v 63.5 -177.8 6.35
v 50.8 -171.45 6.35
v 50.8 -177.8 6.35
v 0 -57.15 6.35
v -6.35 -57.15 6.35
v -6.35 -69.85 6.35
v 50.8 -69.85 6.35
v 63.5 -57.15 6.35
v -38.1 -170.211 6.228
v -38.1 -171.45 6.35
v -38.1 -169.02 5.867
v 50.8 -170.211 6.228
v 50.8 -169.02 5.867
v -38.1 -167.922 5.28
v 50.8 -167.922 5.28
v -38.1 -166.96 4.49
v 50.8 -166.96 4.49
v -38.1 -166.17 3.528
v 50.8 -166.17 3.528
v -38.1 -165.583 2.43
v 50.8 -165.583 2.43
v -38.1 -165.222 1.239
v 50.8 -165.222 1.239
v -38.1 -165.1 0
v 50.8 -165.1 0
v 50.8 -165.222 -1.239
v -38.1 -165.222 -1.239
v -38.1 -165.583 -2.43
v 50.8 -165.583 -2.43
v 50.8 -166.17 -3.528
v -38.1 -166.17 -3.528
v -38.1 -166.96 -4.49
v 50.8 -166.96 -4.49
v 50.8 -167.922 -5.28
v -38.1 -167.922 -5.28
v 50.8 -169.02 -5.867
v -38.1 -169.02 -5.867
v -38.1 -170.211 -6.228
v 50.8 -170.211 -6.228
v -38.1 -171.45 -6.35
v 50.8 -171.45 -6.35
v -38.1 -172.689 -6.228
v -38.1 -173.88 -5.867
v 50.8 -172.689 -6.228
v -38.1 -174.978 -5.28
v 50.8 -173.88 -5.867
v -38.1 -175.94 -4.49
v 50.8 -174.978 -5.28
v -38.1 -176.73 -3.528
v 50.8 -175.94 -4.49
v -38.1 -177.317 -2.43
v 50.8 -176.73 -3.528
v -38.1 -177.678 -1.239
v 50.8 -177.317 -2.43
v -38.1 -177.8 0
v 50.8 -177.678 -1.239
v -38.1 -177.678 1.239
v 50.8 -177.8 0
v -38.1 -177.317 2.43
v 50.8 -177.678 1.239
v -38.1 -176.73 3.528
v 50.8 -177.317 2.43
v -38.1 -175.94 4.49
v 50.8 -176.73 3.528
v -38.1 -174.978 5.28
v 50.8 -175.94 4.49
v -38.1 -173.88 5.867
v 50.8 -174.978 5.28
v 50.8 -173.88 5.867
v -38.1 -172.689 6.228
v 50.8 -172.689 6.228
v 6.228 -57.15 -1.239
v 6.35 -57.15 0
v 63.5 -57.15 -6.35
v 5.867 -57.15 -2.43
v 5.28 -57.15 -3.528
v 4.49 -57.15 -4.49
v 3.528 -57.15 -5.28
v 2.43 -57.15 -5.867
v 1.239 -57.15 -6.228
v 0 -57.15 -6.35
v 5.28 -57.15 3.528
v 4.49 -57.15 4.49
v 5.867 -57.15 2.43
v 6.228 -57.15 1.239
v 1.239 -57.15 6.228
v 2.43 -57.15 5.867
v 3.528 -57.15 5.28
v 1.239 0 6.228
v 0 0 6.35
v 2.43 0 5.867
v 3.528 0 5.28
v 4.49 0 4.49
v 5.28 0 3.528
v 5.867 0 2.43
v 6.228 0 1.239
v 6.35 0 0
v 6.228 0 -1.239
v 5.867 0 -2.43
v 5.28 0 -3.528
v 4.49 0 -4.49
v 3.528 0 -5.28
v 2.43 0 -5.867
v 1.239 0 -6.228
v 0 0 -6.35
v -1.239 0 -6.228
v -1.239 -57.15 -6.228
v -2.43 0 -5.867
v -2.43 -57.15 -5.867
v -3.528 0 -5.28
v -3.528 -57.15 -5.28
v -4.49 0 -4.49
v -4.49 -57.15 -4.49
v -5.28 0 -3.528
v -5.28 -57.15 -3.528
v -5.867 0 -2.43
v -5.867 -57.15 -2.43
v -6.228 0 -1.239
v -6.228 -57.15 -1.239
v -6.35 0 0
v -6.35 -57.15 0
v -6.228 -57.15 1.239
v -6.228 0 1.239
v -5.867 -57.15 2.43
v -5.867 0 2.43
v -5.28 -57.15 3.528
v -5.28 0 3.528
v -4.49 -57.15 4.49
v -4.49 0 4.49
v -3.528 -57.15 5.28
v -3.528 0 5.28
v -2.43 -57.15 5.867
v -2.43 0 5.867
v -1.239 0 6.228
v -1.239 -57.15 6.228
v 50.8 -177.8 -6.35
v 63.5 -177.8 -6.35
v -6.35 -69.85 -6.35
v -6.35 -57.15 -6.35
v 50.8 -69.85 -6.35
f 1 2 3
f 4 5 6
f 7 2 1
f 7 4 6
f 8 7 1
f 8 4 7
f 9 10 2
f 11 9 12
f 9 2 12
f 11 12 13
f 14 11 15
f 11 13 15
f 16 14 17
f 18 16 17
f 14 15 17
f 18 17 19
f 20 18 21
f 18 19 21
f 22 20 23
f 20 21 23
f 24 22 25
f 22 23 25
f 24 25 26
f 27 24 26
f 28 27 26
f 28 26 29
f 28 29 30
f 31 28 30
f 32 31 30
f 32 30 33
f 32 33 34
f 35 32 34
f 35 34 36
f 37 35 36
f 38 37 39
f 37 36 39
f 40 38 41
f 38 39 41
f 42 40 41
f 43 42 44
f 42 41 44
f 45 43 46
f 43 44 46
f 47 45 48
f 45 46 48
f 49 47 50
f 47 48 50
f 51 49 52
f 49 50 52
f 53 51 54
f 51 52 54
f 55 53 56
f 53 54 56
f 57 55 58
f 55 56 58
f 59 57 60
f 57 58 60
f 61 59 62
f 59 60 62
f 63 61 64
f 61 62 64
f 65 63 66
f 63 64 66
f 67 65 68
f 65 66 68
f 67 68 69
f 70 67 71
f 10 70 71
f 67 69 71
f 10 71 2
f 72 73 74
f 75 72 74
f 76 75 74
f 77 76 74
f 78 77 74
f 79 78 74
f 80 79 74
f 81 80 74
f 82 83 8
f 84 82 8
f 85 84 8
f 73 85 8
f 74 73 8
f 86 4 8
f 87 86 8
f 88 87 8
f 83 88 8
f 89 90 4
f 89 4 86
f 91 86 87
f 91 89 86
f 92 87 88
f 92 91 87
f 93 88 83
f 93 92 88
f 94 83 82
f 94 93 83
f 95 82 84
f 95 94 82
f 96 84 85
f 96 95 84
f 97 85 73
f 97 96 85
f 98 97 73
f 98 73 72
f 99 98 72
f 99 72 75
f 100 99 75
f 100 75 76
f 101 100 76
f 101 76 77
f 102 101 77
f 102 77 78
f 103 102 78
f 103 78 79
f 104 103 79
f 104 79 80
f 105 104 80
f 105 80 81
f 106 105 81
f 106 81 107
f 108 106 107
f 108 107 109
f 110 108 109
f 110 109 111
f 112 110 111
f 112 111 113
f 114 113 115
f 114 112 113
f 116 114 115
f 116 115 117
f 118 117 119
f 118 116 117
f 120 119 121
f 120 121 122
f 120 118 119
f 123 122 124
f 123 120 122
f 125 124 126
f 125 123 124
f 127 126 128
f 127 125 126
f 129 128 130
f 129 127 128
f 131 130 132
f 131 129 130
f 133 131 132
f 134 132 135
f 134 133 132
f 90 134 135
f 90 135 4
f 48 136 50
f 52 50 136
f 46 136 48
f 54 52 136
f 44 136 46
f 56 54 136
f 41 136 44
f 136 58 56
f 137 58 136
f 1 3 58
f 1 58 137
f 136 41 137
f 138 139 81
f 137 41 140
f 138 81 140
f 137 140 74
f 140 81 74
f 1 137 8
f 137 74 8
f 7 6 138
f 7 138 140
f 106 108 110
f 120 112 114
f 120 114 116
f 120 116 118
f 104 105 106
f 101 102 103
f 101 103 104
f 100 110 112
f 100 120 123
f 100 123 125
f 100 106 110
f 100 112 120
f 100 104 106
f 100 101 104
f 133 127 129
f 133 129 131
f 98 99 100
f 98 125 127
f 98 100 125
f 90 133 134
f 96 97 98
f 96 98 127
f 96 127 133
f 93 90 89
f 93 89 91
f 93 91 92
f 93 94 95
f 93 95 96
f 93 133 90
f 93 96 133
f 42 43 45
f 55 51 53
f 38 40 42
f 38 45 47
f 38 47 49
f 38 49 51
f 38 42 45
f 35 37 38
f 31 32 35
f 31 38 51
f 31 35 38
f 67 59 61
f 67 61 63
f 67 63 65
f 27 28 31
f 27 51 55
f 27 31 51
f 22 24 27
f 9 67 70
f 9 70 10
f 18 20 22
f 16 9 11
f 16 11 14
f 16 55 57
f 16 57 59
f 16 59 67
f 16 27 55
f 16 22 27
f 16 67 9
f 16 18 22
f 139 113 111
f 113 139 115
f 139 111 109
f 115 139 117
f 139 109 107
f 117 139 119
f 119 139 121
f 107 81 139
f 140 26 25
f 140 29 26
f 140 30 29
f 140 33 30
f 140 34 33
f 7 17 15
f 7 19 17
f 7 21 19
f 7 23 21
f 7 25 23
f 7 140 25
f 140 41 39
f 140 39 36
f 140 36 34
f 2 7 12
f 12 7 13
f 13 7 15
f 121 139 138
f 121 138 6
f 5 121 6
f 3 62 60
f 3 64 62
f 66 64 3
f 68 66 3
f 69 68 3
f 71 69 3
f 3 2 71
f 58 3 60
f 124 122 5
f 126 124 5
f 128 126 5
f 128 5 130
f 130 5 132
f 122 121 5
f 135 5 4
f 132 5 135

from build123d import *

# Parameters (mm, degrees)
SKETCH2_R           = 6.35
BOSS_EXTRUDE1_DEPTH = 57.15
SKETCH4_W           = 69.85
SKETCH4_H           = 12.7
BOSS_EXTRUDE6_DEPTH = 12.7
SKETCH8_W           = 12.7
SKETCH8_H           = 12.7
BOSS_EXTRUDE7_DEPTH = 107.95
SKETCH9_R           = 6.35
BOSS_EXTRUDE8_DEPTH = 88.9


with BuildPart() as part:
    # Sketch2 → Boss-Extrude1 (new body)
    with BuildSketch(Plane(origin=(0, 0, 0), x_dir=(1, 0, 0), z_dir=(0, 1, 0))):
        with Locations(Location((0, 0, 0), (0, 0, 270))):
            Circle(SKETCH2_R)
    extrude(amount=-BOSS_EXTRUDE1_DEPTH)

    # Sketch4 → Boss-Extrude6 (add)
    with BuildSketch(Plane.XZ.offset(57.15)):
        with Locations((28.575, 0)):
            Rectangle(SKETCH4_W, SKETCH4_H)
    extrude(amount=BOSS_EXTRUDE6_DEPTH)

    # Sketch8 → Boss-Extrude7 (add)
    with BuildSketch(Plane.XZ.offset(69.85)):
        with Locations((57.15, 0)):
            Rectangle(SKETCH8_W, SKETCH8_H)
    extrude(amount=BOSS_EXTRUDE7_DEPTH)

    # Sketch9 → Boss-Extrude8 (add)
    with BuildSketch(Plane.ZY.offset(-50.8)):
        with Locations((0, -171.45)):
            Circle(SKETCH9_R)
    extrude(amount=BOSS_EXTRUDE8_DEPTH)


solid = part.part
